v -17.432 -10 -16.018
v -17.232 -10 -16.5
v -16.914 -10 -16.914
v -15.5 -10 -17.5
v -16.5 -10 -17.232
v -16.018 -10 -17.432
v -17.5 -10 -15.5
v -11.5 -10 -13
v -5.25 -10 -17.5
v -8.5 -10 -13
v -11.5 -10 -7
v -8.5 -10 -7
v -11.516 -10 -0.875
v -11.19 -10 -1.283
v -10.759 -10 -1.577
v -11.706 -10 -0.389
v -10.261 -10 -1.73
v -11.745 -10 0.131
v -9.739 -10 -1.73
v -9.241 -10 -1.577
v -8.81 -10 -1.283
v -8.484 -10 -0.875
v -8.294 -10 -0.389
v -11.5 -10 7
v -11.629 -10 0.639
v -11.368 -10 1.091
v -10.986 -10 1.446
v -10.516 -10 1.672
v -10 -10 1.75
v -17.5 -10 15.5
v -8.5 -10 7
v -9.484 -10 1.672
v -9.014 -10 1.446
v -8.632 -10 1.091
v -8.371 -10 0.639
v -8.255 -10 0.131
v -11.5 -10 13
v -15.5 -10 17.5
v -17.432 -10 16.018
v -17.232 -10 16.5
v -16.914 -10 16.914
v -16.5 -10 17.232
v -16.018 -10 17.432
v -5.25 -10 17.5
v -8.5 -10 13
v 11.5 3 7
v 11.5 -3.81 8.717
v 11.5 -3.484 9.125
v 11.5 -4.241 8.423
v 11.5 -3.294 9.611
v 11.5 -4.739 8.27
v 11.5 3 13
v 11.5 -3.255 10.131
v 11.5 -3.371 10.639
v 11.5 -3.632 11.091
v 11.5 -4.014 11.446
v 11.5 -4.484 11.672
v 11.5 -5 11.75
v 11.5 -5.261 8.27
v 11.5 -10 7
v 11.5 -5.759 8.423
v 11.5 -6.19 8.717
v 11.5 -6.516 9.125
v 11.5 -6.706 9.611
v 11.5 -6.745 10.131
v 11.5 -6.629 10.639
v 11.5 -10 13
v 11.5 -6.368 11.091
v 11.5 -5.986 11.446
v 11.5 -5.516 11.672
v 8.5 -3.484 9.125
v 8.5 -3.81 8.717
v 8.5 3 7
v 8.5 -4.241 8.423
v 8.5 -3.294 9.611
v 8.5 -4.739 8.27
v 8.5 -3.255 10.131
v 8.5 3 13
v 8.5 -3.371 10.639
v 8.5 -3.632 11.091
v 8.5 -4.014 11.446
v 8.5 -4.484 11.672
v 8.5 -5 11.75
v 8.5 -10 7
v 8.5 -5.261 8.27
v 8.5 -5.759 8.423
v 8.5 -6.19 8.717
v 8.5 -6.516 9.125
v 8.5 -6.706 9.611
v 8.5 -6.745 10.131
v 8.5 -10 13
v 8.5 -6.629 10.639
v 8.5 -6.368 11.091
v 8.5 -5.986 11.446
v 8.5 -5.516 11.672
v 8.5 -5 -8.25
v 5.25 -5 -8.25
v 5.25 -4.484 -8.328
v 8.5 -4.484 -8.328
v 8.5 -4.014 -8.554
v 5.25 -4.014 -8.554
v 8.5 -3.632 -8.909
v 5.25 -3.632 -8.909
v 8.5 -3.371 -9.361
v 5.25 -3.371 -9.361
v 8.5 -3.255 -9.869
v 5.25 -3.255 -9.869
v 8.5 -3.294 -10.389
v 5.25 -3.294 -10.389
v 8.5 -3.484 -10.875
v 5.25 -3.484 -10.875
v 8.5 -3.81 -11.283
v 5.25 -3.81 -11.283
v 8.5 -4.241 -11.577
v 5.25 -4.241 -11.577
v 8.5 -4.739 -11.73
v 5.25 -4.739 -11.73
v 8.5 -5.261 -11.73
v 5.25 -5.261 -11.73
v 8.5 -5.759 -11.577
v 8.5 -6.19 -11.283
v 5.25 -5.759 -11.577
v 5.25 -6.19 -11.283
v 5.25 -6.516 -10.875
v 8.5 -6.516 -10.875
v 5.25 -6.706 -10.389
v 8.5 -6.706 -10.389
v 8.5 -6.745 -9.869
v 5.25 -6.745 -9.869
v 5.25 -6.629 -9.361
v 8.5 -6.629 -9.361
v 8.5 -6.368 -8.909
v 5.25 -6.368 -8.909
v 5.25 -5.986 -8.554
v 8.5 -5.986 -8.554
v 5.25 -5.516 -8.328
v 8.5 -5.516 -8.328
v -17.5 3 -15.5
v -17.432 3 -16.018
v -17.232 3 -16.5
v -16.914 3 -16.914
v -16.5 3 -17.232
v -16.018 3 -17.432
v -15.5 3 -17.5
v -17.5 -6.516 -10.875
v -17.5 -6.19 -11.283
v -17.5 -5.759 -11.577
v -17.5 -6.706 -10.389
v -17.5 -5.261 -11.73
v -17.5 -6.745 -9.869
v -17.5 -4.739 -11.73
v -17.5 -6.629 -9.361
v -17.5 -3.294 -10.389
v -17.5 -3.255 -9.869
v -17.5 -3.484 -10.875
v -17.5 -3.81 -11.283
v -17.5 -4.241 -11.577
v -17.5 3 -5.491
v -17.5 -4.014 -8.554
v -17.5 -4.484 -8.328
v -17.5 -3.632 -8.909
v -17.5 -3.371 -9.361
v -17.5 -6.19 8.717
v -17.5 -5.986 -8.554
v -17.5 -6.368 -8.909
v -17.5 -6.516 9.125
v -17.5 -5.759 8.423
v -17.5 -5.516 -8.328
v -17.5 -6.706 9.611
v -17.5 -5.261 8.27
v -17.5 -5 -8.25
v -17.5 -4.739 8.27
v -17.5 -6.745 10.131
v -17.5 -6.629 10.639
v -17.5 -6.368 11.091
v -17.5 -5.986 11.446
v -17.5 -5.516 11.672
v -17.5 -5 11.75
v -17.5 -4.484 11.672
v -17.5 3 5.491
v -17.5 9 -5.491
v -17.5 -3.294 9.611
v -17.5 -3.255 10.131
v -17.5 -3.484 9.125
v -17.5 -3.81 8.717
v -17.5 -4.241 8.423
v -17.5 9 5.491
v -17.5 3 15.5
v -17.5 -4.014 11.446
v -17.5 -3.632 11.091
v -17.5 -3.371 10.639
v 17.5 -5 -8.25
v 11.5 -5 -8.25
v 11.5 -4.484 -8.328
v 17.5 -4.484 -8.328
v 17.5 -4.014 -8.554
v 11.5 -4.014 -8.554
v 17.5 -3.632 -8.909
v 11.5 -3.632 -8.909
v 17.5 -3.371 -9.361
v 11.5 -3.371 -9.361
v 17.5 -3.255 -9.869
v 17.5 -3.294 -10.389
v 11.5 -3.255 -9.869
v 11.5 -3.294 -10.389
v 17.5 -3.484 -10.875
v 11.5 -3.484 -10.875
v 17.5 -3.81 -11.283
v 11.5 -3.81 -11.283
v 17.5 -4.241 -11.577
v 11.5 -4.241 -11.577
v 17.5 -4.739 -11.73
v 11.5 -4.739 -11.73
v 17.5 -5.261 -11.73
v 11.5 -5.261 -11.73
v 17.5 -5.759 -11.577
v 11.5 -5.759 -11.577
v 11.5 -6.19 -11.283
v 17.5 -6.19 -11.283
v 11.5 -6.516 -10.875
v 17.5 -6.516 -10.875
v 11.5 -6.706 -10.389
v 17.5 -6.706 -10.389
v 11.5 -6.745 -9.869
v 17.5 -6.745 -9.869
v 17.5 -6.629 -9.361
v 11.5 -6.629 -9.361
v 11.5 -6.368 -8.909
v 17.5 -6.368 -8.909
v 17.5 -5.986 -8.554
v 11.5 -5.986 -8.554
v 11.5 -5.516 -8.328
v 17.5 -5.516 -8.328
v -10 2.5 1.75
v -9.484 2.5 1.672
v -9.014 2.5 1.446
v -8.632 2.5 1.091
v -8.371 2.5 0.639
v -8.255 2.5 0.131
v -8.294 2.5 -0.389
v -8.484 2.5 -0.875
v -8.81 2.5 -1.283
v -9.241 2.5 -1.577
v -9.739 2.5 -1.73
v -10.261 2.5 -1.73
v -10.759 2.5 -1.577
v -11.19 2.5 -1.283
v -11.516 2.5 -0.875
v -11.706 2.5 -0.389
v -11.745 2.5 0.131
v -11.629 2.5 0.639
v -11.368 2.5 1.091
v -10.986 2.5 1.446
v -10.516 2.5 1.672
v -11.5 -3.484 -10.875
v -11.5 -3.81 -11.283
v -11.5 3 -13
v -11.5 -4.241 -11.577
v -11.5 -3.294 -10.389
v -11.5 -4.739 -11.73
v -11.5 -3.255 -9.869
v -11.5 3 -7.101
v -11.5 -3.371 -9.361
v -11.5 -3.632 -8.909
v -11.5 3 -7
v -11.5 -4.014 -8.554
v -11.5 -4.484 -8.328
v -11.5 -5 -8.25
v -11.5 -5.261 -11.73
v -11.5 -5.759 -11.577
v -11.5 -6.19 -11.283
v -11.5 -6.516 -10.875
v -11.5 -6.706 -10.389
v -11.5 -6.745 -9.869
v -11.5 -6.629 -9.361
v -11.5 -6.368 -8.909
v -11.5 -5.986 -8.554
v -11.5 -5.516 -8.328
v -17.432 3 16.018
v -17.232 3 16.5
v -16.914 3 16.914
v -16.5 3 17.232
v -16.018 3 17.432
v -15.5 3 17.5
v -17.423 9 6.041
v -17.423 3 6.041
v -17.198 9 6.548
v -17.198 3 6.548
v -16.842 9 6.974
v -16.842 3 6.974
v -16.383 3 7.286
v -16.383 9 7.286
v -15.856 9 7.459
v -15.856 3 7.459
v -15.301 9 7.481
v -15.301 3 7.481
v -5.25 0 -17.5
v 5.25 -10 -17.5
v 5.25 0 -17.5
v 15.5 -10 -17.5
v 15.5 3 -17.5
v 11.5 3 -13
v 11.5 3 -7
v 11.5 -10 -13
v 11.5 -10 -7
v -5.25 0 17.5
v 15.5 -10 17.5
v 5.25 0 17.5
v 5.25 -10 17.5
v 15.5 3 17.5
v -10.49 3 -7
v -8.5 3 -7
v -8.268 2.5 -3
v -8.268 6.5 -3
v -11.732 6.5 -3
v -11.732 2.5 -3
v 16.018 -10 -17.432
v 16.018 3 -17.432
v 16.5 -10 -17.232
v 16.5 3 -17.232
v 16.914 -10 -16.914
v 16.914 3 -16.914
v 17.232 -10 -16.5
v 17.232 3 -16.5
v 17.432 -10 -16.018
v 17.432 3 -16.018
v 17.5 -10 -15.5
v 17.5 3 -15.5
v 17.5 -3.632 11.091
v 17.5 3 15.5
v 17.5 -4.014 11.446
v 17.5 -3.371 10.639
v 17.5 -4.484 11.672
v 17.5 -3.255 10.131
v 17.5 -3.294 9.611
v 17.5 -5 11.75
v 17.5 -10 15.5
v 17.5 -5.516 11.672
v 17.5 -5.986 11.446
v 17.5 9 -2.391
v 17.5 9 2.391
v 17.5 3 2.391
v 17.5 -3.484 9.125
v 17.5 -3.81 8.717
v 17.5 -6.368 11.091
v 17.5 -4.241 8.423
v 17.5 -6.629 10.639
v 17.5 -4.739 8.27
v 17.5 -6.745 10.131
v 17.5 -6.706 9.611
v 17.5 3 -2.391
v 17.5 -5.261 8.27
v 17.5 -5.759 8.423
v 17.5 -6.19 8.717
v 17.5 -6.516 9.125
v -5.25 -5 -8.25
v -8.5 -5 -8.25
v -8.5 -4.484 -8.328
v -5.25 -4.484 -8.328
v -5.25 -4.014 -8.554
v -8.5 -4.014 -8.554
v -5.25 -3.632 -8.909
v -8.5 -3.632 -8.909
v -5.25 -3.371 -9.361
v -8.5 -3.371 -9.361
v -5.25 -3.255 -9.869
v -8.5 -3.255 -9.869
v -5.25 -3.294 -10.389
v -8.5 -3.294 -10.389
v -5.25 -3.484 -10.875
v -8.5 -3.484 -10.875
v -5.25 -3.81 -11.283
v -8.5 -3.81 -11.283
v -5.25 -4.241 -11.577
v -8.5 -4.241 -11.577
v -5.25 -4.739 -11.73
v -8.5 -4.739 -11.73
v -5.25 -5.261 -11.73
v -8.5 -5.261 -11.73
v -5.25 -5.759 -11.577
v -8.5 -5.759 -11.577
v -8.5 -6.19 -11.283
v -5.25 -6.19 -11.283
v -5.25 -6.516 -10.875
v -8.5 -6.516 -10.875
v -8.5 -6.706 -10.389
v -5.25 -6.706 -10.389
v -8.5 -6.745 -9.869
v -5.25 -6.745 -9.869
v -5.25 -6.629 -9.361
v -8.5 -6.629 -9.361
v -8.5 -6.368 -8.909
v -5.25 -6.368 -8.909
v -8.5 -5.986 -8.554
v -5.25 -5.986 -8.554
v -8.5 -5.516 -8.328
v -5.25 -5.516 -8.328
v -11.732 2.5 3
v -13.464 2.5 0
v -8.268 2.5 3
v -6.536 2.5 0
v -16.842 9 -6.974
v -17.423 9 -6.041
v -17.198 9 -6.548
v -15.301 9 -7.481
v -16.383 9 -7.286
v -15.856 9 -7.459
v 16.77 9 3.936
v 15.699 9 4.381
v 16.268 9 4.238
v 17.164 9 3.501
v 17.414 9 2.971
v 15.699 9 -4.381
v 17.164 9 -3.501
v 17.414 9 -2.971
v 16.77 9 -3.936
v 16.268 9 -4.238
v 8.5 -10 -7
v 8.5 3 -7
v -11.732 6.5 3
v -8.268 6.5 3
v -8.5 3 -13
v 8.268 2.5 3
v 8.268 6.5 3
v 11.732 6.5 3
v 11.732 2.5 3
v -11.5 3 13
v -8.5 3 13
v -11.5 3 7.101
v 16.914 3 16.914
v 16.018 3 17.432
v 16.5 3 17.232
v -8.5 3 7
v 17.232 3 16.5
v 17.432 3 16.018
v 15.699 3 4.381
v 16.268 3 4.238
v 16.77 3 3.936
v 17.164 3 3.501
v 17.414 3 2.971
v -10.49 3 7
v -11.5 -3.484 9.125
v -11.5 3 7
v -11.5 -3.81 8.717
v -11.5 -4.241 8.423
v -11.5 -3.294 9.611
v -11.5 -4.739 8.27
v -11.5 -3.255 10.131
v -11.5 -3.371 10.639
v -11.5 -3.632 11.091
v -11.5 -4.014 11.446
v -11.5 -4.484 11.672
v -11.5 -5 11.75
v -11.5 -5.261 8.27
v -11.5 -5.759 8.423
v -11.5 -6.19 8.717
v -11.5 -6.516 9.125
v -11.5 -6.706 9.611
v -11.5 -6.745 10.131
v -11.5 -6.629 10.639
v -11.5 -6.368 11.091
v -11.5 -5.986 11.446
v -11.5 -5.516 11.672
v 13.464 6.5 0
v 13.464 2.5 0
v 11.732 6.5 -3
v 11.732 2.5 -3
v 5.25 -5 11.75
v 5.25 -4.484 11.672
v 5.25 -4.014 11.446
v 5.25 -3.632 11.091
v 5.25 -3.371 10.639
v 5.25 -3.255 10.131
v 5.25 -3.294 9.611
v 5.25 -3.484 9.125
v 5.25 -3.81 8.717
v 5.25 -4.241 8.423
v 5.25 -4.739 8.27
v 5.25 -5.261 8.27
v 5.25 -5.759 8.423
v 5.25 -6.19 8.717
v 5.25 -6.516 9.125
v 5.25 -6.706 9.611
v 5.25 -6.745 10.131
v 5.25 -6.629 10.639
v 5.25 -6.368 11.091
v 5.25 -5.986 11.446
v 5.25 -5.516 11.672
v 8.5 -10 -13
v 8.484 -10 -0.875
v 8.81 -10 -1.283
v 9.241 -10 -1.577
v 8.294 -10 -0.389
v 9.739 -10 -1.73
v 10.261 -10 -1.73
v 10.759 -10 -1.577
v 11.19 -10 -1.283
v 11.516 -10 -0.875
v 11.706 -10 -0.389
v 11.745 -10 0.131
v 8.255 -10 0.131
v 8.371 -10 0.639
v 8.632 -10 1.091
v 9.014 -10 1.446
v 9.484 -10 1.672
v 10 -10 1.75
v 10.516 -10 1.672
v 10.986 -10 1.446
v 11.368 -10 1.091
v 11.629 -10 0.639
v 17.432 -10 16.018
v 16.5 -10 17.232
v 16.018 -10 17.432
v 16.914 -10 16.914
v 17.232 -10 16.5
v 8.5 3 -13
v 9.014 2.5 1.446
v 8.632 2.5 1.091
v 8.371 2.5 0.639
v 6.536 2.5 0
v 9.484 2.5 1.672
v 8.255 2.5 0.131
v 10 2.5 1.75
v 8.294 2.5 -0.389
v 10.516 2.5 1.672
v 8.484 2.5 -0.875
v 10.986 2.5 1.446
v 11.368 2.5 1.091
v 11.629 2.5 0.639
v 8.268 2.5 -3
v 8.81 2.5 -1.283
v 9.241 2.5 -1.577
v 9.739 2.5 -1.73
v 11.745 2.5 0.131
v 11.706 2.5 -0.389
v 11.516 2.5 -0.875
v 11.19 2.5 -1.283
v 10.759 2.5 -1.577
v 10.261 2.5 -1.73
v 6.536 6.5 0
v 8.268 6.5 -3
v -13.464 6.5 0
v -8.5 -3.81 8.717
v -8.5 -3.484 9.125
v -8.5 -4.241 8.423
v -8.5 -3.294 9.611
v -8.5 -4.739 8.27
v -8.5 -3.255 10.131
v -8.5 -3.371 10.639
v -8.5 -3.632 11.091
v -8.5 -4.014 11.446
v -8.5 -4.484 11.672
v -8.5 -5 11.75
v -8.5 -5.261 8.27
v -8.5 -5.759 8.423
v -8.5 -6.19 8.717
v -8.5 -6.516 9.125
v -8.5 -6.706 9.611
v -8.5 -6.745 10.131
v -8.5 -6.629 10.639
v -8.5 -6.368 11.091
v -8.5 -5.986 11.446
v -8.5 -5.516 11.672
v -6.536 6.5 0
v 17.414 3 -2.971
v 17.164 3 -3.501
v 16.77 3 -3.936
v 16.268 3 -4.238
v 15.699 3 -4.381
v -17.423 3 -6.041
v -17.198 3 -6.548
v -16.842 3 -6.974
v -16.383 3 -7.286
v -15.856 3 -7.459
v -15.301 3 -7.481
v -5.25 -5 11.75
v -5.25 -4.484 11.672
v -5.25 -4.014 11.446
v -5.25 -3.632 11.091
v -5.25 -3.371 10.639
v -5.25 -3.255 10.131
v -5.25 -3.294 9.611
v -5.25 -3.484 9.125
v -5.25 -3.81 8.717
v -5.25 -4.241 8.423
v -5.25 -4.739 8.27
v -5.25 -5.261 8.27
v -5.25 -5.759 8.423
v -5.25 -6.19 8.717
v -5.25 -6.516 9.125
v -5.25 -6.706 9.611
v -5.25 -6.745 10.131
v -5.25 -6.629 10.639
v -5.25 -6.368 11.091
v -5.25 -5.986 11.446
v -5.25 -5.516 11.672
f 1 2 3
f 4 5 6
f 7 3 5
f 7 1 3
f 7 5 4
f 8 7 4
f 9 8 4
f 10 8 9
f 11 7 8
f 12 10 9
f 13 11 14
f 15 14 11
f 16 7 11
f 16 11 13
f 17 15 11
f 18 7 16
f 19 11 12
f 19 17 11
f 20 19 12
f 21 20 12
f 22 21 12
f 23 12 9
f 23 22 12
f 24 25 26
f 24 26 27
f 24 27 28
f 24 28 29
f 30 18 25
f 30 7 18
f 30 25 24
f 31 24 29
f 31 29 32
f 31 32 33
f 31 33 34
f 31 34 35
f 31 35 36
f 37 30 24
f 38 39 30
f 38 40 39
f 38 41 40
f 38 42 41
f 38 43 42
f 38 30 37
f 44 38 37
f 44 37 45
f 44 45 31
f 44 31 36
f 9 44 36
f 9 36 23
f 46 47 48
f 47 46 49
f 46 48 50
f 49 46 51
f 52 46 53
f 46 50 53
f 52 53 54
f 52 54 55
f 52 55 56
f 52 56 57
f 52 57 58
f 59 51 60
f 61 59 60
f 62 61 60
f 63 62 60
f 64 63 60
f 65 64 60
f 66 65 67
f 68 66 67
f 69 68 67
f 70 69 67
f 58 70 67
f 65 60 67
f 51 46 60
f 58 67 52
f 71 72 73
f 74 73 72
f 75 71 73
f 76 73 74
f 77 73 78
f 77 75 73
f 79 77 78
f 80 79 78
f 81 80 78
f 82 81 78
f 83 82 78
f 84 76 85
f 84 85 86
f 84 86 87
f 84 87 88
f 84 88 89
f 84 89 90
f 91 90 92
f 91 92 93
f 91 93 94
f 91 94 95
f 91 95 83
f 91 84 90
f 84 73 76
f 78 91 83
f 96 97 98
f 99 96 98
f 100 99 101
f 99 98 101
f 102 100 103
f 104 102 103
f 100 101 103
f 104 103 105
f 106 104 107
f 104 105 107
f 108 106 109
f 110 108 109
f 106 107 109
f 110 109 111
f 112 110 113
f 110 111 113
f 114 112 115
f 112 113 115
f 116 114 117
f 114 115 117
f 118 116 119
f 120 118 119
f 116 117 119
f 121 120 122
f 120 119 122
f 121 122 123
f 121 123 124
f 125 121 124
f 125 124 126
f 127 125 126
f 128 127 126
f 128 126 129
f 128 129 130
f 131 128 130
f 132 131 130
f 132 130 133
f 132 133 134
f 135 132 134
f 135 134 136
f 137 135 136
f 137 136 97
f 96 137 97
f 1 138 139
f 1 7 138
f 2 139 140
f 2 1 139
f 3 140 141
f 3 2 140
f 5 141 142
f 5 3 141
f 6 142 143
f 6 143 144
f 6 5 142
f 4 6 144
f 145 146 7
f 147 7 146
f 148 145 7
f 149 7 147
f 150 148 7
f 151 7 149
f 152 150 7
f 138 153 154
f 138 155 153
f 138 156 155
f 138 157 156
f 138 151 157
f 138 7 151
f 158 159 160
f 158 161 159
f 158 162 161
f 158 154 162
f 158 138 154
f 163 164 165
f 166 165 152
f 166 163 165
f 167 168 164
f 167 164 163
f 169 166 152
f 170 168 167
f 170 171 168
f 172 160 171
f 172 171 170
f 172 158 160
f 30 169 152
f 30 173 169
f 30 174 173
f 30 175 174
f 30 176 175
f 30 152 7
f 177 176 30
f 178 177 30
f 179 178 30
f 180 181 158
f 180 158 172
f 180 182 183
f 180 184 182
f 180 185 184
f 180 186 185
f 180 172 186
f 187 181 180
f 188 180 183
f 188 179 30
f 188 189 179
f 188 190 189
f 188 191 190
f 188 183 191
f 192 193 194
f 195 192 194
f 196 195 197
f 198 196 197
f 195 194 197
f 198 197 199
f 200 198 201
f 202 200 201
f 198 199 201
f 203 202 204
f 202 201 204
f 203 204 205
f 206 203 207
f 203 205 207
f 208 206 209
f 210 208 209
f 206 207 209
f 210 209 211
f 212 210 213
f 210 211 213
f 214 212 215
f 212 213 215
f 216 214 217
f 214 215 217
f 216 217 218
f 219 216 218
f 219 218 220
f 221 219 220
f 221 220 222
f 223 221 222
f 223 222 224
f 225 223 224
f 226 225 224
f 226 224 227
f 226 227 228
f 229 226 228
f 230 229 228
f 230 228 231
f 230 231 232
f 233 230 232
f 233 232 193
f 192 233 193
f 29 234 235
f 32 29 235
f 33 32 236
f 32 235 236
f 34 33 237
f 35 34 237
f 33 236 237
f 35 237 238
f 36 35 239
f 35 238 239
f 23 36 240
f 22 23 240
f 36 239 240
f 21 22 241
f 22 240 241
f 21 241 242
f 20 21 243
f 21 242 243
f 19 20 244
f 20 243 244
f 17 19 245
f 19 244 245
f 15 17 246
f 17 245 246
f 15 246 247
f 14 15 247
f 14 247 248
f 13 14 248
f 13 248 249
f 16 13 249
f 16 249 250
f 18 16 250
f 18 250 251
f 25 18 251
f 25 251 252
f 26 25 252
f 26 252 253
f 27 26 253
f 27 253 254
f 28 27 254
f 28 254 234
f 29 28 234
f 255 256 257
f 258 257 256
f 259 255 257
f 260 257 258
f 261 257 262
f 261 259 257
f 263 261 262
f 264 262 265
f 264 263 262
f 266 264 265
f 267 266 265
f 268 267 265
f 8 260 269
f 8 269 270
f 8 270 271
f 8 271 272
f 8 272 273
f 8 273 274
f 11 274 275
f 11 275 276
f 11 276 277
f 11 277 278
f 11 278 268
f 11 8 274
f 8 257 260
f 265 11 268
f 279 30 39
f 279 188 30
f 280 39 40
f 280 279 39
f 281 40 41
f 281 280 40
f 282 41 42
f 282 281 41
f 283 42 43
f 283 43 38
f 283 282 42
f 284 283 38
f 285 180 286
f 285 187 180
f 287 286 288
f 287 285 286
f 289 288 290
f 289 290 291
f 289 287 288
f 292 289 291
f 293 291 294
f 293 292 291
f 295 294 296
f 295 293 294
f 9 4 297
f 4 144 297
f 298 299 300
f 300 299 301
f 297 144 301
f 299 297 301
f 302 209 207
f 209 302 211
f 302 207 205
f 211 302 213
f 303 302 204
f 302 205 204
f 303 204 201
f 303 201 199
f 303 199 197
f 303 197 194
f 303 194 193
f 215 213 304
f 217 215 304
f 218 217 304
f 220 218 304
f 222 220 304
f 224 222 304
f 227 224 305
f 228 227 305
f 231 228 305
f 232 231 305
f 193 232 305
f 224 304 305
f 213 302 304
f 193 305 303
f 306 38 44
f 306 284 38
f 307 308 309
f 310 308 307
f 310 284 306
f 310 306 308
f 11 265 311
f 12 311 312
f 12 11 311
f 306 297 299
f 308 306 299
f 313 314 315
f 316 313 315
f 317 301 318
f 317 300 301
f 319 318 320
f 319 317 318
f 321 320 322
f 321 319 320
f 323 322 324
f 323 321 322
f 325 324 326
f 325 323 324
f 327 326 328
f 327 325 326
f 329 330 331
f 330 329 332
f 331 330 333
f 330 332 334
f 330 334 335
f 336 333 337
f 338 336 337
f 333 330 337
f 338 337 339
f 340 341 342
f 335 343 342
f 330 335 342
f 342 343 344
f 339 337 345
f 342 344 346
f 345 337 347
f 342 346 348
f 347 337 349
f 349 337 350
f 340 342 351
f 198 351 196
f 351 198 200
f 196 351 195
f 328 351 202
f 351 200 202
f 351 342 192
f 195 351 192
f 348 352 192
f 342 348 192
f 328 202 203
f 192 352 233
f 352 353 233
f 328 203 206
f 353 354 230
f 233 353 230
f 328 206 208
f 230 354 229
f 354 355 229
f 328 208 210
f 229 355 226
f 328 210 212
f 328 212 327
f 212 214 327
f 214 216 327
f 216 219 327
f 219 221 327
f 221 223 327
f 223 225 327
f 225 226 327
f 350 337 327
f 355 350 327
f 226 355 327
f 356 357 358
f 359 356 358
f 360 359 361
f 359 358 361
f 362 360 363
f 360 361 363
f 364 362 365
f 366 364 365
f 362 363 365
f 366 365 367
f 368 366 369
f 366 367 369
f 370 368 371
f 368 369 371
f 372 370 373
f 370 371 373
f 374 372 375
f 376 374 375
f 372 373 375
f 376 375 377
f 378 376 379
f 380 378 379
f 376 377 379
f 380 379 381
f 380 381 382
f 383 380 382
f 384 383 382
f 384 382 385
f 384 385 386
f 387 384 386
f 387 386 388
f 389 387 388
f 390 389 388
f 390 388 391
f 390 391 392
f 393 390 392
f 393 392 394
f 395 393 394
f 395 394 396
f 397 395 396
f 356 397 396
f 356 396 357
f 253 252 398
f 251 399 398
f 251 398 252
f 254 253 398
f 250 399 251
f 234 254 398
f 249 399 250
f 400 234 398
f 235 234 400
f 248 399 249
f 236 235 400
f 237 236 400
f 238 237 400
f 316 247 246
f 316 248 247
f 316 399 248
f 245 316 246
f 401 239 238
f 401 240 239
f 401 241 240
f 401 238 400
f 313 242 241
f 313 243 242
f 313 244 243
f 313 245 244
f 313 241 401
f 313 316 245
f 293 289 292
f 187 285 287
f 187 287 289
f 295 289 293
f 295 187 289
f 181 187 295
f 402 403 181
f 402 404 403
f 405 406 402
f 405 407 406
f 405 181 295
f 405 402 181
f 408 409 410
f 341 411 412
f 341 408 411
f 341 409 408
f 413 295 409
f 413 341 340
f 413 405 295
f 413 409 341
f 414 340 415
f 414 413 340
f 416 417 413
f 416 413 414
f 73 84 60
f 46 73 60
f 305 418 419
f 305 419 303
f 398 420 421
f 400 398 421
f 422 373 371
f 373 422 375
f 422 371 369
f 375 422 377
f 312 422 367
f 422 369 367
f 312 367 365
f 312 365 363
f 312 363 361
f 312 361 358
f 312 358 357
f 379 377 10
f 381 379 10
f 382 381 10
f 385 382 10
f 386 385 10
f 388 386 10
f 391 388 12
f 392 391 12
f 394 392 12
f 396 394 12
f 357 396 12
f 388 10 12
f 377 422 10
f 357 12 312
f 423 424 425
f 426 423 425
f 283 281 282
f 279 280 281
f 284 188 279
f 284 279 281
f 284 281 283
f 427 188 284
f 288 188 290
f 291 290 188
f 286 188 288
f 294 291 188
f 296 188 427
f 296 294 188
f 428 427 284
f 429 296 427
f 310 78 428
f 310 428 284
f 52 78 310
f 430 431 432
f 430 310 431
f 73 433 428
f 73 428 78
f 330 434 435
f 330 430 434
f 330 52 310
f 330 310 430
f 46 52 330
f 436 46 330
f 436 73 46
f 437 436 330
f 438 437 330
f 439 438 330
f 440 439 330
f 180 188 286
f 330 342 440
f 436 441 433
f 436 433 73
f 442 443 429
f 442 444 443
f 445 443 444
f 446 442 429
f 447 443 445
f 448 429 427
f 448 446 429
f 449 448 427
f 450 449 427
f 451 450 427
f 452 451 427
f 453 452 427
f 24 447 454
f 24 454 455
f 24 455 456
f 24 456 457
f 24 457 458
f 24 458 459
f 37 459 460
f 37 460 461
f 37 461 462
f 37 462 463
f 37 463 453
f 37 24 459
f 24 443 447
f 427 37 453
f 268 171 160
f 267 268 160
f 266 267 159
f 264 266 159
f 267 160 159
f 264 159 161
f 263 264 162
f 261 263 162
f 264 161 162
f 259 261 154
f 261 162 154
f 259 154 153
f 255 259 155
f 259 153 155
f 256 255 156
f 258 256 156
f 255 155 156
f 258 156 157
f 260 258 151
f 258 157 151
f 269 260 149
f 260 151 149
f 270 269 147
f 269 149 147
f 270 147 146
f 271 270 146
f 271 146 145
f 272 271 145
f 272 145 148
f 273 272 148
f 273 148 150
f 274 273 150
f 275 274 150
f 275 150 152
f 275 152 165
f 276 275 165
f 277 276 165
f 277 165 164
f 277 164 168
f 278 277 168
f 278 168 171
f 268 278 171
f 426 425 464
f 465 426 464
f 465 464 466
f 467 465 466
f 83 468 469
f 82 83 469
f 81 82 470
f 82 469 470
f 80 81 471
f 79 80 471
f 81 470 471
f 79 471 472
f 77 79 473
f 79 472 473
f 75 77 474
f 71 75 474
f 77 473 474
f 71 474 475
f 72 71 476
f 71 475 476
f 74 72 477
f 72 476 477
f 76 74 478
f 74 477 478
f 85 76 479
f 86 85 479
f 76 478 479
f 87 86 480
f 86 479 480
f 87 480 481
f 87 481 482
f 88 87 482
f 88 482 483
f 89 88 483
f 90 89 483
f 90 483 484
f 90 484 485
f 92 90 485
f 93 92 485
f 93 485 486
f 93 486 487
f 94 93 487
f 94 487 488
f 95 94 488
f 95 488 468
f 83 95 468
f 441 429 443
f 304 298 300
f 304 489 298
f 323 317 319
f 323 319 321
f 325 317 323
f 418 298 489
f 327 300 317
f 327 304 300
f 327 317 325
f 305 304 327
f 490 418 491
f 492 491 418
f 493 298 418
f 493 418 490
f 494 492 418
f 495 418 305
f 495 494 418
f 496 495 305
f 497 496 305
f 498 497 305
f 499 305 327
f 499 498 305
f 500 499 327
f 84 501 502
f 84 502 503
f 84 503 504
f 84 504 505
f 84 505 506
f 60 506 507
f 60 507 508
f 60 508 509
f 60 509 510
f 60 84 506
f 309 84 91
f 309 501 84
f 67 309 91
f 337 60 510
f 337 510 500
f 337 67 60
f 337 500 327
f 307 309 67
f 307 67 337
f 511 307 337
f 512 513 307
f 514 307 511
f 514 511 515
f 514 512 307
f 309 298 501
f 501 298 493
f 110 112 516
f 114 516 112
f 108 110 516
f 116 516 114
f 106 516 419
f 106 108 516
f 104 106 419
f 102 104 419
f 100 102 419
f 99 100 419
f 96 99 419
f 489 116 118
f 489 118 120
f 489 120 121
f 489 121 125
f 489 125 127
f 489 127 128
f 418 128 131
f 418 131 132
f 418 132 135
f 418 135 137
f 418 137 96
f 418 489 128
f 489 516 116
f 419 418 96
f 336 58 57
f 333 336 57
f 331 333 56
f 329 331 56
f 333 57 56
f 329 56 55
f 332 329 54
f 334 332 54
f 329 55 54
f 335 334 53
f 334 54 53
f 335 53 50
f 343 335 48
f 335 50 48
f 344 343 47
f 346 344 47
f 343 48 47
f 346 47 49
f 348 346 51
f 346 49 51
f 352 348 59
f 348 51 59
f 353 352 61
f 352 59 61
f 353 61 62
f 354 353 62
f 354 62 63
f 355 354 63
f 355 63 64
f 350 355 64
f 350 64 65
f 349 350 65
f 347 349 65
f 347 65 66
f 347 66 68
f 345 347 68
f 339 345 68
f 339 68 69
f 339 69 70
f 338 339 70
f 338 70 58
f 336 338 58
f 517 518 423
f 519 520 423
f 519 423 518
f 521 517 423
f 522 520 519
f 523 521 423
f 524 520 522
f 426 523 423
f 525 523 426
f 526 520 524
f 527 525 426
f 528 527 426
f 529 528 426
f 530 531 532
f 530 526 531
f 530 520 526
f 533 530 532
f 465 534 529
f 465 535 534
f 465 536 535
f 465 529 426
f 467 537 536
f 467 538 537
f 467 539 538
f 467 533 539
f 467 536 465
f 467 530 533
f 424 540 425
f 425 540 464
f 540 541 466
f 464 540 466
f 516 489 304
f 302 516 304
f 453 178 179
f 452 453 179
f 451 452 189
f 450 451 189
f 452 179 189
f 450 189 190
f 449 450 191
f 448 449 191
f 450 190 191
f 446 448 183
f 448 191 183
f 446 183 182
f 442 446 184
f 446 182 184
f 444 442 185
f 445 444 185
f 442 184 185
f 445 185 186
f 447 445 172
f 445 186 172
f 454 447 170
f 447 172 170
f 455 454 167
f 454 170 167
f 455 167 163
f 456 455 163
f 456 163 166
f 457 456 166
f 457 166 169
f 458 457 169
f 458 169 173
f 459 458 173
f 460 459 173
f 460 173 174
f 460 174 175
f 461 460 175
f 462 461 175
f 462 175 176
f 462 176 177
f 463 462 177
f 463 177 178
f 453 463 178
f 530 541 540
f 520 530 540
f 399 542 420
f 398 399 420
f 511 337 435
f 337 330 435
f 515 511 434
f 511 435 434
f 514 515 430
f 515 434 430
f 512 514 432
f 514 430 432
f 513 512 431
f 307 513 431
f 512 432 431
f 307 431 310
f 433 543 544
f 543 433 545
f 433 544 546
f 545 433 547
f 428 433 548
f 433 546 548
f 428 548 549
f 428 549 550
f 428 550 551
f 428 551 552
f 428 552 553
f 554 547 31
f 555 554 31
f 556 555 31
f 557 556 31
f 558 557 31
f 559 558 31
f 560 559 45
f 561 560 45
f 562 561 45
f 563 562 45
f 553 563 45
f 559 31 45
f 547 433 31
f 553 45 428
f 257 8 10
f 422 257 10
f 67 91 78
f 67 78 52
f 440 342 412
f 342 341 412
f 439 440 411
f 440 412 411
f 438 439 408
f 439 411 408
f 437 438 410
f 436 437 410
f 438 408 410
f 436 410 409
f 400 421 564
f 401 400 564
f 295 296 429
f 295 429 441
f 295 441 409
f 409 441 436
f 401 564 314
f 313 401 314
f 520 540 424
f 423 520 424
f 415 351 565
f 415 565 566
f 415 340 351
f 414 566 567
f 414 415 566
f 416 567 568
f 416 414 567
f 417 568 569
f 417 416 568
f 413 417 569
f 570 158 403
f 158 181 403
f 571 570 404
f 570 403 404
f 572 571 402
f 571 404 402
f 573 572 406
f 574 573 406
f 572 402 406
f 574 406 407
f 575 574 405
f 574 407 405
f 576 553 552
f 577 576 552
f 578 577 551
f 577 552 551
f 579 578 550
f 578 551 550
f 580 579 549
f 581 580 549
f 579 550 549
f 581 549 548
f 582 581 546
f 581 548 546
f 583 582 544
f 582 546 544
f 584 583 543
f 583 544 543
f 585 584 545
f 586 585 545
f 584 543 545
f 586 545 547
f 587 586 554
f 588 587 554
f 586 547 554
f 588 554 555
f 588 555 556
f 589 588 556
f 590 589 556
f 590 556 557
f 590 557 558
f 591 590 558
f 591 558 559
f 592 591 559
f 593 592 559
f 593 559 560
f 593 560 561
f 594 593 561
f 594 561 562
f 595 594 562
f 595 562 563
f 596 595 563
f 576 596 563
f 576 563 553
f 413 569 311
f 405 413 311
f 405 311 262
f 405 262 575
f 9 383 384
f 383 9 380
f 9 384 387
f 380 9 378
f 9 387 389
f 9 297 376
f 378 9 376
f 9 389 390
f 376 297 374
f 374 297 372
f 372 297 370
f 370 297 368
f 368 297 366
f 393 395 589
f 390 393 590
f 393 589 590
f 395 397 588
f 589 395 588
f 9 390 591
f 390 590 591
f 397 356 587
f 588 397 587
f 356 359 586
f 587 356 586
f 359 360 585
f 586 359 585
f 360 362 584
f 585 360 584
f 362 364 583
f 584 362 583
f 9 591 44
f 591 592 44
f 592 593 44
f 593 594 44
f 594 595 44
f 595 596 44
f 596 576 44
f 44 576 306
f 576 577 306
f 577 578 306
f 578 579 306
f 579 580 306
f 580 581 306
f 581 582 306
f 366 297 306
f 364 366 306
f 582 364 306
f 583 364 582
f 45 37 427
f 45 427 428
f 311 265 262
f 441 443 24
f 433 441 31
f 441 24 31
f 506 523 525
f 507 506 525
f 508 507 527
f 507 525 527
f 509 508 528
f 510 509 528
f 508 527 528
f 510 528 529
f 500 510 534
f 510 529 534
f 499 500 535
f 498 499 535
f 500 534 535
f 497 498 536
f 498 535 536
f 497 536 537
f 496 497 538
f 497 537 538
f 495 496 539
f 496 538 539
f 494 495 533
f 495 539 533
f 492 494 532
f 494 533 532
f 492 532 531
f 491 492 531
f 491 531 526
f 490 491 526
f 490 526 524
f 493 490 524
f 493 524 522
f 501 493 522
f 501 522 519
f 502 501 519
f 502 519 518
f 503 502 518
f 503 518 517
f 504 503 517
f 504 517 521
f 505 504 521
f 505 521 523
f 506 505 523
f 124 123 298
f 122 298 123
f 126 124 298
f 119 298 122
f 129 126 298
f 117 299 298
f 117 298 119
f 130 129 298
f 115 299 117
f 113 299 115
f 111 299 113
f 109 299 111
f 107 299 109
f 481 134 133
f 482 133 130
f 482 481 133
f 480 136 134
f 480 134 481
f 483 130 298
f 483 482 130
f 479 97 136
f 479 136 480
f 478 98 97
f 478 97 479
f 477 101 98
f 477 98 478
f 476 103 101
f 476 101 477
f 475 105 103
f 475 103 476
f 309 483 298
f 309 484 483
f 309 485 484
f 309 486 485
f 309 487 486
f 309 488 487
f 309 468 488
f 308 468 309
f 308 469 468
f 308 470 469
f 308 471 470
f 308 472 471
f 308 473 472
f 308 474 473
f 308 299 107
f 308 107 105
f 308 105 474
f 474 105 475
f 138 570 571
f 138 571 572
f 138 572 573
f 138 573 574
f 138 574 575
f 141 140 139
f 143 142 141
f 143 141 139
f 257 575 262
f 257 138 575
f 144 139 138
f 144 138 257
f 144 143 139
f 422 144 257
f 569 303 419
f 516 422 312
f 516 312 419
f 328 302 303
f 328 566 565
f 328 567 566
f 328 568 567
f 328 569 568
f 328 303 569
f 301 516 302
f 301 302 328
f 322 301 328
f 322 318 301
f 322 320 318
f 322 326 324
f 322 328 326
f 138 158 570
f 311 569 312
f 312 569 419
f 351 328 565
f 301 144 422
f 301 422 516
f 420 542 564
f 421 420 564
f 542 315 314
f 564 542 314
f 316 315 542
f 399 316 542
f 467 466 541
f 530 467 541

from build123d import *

# Parameters (mm, degrees)
SKETCH_1_W          = 35
SKETCH_1_H          = 35
EXTRUDE_6_DEPTH     = 3
EXTRUDE_7_DEPTH     = 6
SKETCH_6_W          = 12.25
SKETCH_6_H          = 35
EXTRUDE_8_DEPTH     = 10
FILLET_2_R          = 2
SKETCH_7_R          = 1.75
CUT_EXTRUDE_3_DEPTH = 41.388736054
SKETCH_8_W          = 3
SKETCH_8_H          = 6
CUT_EXTRUDE_4_DEPTH = 13
CUT_EXTRUDE_5_DEPTH = 4
SKETCH_12_R         = 1.75
CUT_EXTRUDE_6_DEPTH = 28.726341266


with BuildPart() as part:
    # Эскиз1 → Бобышка-Вытянуть6 (new body)
    with BuildSketch(Plane(origin=(0, 0, 0), x_dir=(1, 0, 0), z_dir=(0, 1, 0))):
        Rectangle(SKETCH_1_W, SKETCH_1_H)
    extrude(amount=EXTRUDE_6_DEPTH)

    # Эскиз5 → Бобышка-Вытянуть7 (add)
    with BuildSketch(Plane(origin=(0, 3, 0), x_dir=(1, 0, 0), z_dir=(0, 1, 0))):
        Polygon((-17.5, 7.700997512), (-17.5, 7.5), (-17.5, -7.5), (-17.5, -7.700997512), (17.5, -4.200997512), (17.5, -4), (17.5, 4), (17.5, 4.200997512), align=None)
    extrude(amount=EXTRUDE_7_DEPTH)

    # Эскиз6 → Бобышка-Вытянуть8 (add)
    with BuildSketch(Plane.XZ):
        with Locations((-11.375, 0)):
            Rectangle(SKETCH_6_W, SKETCH_6_H)
        with Locations((11.375, 0)):
            Rectangle(SKETCH_6_W, SKETCH_6_H)
    extrude(amount=EXTRUDE_8_DEPTH)

    # Скругление2
    fillet_2_edges = [part.edges().sort_by_distance(p)[0] for p in [
        (17.5, 6, 4.200997512),
        (17.5, 6, -4.200997512),
        (-17.5, 6, -7.700997512),
        (-17.5, 6, 7.700997512),
        (-17.5, -3.5, 17.5),
        (17.5, -3.5, 17.5),
        (17.5, -3.5, -17.5),
        (-17.5, -3.5, -17.5),
    ]]
    fillet(fillet_2_edges, radius=FILLET_2_R)

    # Эскиз7 → Вырез-Вытянуть3 (cut, through all)
    with BuildSketch(Plane.ZY.offset(17.5)):
        with Locations((-10, -5)):
            Circle(SKETCH_7_R)
        with Locations((10, -5)):
            Circle(SKETCH_7_R)
    extrude(amount=-CUT_EXTRUDE_3_DEPTH, mode=Mode.SUBTRACT)

    # Эскиз8 → Вырез-Вытянуть4 (cut)
    with BuildSketch(Plane.XZ.offset(10)):
        with Locations((-10, -10)):
            Rectangle(SKETCH_8_W, SKETCH_8_H)
        with Locations((10, -10)):
            Rectangle(SKETCH_8_W, SKETCH_8_H)
        with Locations((-10, 10)):
            Rectangle(SKETCH_8_W, SKETCH_8_H)
        with Locations((10, 10)):
            Rectangle(SKETCH_8_W, SKETCH_8_H)
    extrude(amount=-CUT_EXTRUDE_4_DEPTH, mode=Mode.SUBTRACT)

    # Эскиз11 → Вырез-Вытянуть5 (cut)
    with BuildSketch(Plane(origin=(0, 6.5, 0), x_dir=(1, 0, 0), z_dir=(0, 1, 0))):
        Polygon((-8.267949192, -3), (-6.535898385, 0), (-8.267949192, 3), (-11.732050808, 3), (-13.464101615, 0), (-11.732050808, -3), align=None)
        Polygon((6.535898385, 0), (8.267949192, -3), (11.732050808, -3), (13.464101615, 0), (11.732050808, 3), (8.267949192, 3), align=None)
    extrude(amount=-CUT_EXTRUDE_5_DEPTH, mode=Mode.SUBTRACT)

    # Эскиз12 → Вырез-Вытянуть6 (cut, through all)
    with BuildSketch(Plane(origin=(0, 2.5, 0), x_dir=(1, 0, 0), z_dir=(0, 1, 0))):
        with Locations(Location((-10, 0, 0), (0, 0, 270))):
            Circle(SKETCH_12_R)
        with Locations(Location((10, 0, 0), (0, 0, 270))):
            Circle(SKETCH_12_R)
    extrude(amount=-CUT_EXTRUDE_6_DEPTH, mode=Mode.SUBTRACT)


solid = part.part
